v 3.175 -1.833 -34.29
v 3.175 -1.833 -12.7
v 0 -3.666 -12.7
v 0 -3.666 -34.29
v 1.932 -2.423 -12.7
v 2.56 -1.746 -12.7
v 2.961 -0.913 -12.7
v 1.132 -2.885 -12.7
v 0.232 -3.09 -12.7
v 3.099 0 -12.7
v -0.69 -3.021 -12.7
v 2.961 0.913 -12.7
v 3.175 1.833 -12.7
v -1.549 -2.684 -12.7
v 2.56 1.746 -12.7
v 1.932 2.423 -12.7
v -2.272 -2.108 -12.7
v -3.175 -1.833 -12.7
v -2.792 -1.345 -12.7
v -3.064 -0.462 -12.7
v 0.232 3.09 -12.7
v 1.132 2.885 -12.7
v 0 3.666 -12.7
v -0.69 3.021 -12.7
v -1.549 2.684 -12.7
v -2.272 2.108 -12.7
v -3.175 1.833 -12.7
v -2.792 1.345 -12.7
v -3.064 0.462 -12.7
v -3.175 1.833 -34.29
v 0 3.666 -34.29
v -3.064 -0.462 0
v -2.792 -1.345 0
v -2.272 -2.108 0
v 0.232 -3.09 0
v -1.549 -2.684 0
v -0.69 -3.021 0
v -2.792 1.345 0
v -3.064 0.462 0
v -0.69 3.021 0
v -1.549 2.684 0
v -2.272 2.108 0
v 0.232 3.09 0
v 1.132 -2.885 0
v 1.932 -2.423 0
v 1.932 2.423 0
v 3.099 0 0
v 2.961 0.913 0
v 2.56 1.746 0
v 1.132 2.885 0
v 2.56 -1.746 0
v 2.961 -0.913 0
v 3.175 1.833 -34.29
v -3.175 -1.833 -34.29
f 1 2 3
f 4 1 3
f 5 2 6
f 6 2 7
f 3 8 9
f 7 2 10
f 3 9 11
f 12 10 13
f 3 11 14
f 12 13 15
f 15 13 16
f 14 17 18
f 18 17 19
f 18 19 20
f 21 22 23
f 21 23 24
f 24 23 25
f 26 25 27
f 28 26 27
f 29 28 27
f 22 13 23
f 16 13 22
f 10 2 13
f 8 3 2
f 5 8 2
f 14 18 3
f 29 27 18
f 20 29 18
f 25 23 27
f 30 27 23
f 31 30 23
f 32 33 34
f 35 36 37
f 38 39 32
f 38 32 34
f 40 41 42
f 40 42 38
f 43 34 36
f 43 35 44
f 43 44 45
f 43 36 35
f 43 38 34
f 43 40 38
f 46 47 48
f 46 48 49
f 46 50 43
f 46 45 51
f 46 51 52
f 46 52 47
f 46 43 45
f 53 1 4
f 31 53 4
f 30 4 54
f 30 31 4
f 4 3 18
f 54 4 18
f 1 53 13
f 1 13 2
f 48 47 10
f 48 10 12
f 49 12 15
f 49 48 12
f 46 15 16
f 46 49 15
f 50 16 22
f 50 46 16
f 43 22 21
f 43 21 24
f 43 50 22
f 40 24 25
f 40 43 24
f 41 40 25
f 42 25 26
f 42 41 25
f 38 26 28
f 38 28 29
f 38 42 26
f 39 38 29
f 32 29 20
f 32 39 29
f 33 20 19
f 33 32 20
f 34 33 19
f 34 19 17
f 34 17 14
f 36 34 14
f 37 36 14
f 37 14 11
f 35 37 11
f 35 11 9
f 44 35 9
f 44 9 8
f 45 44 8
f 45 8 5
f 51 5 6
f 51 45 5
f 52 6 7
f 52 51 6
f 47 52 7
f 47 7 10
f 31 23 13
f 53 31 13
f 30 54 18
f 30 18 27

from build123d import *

# Parameters (mm, degrees)
SKETCH1_R           = 3.0988
BOSS_EXTRUDE1_DEPTH = 12.7
BOSS_EXTRUDE2_DEPTH = 21.59


with BuildPart() as part:
    # Sketch1 → Boss-Extrude1 (new body)
    with BuildSketch(Plane.XY):
        Circle(SKETCH1_R)
    extrude(amount=-BOSS_EXTRUDE1_DEPTH)

    # Sketch2 → Boss-Extrude2 (add)
    with BuildSketch(Plane(origin=(0, 0, -12.7), x_dir=(-1, 0, 0), z_dir=(0, 0, -1))):
        Polygon((0, 3.666174209), (-3.175, 1.833087105), (-3.175, -1.833087105), (0, -3.666174209), (3.175, -1.833087105), (3.175, 1.833087105), align=None)
    extrude(amount=BOSS_EXTRUDE2_DEPTH)


solid = part.part
